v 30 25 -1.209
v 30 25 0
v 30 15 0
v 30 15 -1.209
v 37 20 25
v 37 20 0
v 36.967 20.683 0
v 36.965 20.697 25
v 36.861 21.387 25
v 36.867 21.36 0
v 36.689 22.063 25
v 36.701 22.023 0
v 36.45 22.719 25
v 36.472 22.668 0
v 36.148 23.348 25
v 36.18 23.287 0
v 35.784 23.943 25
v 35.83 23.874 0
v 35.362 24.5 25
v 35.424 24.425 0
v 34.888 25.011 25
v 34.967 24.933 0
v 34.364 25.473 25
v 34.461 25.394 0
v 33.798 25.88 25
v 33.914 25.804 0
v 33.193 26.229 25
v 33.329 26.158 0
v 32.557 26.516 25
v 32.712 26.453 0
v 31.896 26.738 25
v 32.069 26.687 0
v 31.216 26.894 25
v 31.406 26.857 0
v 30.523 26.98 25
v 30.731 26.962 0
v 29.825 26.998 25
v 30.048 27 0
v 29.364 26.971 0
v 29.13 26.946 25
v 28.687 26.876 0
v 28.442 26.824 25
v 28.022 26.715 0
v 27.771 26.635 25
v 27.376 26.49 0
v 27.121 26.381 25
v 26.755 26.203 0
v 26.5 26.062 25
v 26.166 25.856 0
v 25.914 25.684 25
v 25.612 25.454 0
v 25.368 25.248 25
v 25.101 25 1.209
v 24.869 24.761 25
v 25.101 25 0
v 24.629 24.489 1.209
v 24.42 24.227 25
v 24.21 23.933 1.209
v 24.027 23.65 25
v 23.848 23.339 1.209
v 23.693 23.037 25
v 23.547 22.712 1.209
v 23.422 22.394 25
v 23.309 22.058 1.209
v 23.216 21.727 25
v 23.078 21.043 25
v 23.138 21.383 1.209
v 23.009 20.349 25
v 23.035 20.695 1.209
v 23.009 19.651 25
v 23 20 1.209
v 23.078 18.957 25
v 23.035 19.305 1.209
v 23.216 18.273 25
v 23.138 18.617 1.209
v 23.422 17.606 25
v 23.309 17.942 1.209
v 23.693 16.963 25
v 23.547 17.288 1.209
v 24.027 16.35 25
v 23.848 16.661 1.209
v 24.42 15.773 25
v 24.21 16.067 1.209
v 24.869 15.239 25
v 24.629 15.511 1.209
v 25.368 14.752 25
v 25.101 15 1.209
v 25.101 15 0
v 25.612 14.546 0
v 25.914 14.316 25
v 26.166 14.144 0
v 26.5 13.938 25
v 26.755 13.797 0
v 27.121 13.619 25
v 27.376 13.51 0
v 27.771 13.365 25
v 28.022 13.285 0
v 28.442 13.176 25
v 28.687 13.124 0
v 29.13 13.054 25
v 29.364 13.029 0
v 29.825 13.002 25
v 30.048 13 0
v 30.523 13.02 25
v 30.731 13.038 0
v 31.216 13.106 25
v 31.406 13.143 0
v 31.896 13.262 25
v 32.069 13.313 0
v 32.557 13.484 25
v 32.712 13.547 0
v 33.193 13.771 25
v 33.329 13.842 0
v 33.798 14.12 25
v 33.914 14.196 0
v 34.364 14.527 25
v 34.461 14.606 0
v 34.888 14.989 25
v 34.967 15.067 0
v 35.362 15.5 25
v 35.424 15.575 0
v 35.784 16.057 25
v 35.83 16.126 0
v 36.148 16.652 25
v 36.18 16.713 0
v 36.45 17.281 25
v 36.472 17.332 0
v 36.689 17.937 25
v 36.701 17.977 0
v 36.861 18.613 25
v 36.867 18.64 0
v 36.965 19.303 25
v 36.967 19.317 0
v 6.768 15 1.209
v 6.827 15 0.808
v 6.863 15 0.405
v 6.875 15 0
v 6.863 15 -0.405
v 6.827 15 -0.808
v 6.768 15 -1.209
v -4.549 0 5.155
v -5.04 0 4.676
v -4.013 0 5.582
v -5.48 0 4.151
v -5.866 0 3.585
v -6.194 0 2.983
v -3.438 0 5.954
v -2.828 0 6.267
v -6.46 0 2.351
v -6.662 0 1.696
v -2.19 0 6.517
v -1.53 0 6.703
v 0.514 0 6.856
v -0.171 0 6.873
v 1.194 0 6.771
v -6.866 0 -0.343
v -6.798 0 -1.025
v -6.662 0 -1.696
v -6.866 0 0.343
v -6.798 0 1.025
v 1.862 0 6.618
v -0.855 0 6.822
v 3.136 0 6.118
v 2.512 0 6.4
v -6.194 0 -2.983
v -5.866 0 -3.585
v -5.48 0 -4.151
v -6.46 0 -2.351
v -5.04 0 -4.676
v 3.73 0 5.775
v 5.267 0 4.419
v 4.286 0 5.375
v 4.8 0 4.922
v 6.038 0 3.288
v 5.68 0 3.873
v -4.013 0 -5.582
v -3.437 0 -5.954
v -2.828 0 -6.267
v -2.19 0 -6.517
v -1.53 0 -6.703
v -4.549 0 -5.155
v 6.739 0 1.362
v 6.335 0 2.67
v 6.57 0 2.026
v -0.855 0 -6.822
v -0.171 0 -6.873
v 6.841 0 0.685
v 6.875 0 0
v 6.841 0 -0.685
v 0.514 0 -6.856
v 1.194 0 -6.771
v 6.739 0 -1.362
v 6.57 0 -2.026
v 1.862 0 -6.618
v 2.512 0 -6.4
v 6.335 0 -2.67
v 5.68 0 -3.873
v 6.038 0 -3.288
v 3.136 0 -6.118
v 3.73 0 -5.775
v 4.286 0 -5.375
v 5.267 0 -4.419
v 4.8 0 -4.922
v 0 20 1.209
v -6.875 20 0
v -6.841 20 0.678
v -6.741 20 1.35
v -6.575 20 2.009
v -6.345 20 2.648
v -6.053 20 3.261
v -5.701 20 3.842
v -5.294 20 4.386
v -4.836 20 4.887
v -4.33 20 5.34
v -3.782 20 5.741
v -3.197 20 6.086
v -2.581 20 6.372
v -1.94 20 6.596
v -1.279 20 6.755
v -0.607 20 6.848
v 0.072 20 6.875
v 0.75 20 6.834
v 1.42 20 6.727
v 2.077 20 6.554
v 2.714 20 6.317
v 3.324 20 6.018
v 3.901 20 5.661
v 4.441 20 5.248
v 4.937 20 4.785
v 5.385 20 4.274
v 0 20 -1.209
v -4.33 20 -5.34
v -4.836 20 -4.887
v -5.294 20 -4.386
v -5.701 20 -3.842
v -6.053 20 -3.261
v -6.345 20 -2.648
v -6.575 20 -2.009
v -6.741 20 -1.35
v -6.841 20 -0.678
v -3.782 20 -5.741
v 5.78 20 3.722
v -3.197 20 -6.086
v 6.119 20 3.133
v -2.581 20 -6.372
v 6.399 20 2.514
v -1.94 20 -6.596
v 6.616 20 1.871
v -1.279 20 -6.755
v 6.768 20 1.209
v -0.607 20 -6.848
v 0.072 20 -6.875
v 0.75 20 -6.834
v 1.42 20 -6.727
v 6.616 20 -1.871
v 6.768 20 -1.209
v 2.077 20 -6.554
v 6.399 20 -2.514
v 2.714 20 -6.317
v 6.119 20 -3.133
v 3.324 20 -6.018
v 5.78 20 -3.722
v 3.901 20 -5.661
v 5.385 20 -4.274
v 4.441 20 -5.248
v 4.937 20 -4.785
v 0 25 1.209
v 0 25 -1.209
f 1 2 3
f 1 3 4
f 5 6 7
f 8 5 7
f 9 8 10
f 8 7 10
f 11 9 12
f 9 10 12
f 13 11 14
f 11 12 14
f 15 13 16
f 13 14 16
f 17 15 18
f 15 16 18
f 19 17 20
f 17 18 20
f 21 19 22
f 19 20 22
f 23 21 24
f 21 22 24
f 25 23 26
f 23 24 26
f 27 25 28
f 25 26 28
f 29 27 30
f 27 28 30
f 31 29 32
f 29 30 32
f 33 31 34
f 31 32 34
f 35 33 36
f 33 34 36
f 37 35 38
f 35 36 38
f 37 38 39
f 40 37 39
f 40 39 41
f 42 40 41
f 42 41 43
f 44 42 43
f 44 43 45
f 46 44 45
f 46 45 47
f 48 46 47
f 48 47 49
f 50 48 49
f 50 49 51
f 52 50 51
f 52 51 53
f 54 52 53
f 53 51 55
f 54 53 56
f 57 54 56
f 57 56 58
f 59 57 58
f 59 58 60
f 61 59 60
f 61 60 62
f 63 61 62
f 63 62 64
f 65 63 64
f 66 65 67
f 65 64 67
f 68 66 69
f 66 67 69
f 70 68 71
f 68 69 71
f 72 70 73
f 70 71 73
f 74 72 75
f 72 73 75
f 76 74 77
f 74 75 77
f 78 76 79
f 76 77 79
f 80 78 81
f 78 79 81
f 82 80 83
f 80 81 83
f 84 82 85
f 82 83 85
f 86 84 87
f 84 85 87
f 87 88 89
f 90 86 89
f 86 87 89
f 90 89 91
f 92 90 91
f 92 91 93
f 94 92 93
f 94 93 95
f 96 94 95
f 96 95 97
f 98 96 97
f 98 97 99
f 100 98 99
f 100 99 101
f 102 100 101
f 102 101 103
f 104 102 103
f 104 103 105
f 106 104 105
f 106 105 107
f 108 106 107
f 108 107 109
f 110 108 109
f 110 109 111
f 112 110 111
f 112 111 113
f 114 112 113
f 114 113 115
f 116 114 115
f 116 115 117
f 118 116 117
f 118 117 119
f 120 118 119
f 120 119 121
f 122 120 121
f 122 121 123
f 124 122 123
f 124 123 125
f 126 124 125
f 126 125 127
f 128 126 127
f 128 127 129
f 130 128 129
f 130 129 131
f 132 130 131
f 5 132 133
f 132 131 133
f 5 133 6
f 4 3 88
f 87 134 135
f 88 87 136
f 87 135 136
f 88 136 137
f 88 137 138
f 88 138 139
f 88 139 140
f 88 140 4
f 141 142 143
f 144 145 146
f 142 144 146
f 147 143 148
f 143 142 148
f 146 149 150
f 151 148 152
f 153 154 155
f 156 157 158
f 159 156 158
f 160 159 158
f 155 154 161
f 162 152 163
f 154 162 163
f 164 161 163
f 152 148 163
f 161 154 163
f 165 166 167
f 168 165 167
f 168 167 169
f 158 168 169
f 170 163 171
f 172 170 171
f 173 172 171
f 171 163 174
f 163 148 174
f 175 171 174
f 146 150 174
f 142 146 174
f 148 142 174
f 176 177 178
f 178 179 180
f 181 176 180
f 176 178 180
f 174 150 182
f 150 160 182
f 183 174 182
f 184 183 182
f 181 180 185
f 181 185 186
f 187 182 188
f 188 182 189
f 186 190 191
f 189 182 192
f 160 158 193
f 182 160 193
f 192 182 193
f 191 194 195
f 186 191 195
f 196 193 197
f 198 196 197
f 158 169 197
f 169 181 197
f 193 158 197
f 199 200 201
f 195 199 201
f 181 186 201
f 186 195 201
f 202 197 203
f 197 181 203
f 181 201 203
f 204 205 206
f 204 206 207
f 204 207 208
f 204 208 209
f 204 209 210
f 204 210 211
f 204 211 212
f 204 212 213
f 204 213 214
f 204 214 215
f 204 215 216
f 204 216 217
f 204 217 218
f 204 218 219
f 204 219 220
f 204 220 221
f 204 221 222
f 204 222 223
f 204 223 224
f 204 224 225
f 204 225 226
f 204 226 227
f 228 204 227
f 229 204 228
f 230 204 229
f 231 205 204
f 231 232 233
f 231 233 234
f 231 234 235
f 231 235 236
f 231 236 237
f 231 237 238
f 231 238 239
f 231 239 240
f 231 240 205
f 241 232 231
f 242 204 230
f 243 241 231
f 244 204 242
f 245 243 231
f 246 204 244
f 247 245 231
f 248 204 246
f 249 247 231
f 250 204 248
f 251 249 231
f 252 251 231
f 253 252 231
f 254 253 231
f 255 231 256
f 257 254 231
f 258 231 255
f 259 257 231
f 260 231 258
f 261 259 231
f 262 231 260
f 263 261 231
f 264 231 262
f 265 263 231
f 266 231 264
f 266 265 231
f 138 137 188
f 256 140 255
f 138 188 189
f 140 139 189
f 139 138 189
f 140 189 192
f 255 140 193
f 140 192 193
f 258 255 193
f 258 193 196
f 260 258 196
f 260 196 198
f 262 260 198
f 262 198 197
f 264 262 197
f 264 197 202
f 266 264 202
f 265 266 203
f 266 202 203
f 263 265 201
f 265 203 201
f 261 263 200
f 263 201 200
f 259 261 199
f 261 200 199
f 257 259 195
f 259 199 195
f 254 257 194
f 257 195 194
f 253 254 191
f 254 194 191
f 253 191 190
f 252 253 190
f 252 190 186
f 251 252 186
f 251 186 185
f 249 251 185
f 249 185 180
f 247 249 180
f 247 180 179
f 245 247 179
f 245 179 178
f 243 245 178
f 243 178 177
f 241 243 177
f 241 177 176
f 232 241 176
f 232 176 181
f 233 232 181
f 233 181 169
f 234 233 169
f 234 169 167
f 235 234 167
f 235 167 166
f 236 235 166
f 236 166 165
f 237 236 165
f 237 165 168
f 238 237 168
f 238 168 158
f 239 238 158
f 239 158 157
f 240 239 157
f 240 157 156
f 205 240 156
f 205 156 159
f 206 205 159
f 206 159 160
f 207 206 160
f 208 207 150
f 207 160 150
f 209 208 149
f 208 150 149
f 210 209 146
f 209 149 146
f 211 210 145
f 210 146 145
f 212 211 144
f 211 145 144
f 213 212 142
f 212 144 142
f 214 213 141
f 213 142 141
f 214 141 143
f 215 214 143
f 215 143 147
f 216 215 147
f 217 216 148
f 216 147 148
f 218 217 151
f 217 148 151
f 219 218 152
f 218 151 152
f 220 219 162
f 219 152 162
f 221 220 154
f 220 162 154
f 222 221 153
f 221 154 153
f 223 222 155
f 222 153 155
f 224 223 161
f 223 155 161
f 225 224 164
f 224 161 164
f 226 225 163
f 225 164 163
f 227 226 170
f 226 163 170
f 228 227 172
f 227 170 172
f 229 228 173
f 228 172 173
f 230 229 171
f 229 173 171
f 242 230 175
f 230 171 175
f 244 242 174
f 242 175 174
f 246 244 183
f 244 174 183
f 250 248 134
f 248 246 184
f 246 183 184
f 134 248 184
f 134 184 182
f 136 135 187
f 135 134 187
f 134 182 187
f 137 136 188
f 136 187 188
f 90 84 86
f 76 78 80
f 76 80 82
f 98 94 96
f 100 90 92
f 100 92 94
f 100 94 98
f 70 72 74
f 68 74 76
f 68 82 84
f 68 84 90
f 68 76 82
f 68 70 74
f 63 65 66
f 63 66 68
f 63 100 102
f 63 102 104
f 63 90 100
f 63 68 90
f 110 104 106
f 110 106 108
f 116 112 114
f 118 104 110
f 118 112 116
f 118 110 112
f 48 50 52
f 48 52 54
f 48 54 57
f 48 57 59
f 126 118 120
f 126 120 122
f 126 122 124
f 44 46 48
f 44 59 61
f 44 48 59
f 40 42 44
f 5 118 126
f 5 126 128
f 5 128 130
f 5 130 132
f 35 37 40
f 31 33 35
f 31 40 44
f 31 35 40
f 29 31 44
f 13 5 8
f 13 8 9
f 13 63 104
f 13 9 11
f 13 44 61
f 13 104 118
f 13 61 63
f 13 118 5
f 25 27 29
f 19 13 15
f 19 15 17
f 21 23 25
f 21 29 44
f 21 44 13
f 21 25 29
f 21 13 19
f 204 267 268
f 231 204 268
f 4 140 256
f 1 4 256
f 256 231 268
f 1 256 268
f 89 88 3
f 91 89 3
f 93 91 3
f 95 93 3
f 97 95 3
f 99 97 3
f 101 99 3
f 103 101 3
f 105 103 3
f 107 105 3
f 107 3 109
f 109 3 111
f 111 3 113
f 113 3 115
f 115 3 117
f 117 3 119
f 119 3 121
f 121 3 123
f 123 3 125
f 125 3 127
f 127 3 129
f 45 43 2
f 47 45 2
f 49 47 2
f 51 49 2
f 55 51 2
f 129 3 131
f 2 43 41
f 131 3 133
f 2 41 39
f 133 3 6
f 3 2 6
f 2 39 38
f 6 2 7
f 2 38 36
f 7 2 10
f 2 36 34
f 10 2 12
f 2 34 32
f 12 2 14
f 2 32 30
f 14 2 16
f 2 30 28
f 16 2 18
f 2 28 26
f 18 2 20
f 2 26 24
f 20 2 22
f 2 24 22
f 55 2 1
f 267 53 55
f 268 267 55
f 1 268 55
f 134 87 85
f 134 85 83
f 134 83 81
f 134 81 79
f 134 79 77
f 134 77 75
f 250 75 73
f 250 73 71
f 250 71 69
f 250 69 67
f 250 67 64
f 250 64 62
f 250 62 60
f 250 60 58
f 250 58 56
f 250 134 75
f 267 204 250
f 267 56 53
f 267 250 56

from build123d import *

# Parameters (mm, degrees)
SKETCH1_R           = 6.875
BOSS_EXTRUDE1_DEPTH = 20
SKETCH2_W           = 2.41756572
SKETCH2_H           = 10
BOSS_EXTRUDE2_DEPTH = 30
SKETCH3_R           = 7
BOSS_EXTRUDE3_DEPTH = 25


with BuildPart() as part:
    # Sketch1 → Boss-Extrude1 (new body)
    with BuildSketch(Plane(origin=(0, 0, 0), x_dir=(1, 0, 0), z_dir=(0, 1, 0))):
        Circle(SKETCH1_R)
    extrude(amount=BOSS_EXTRUDE1_DEPTH)

    # Sketch2 → Boss-Extrude2 (add)
    with BuildSketch(Plane(origin=(0, 0, 0), x_dir=(0, 0, -1), z_dir=(1, 0, 0))):
        with Locations((0, 20)):
            Rectangle(SKETCH2_W, SKETCH2_H)
    extrude(amount=BOSS_EXTRUDE2_DEPTH)

    # Sketch3 → Boss-Extrude3 (add)
    with BuildSketch(Plane.XY):
        with Locations((30, 20)):
            Circle(SKETCH3_R)
    extrude(amount=BOSS_EXTRUDE3_DEPTH)


solid = part.part
